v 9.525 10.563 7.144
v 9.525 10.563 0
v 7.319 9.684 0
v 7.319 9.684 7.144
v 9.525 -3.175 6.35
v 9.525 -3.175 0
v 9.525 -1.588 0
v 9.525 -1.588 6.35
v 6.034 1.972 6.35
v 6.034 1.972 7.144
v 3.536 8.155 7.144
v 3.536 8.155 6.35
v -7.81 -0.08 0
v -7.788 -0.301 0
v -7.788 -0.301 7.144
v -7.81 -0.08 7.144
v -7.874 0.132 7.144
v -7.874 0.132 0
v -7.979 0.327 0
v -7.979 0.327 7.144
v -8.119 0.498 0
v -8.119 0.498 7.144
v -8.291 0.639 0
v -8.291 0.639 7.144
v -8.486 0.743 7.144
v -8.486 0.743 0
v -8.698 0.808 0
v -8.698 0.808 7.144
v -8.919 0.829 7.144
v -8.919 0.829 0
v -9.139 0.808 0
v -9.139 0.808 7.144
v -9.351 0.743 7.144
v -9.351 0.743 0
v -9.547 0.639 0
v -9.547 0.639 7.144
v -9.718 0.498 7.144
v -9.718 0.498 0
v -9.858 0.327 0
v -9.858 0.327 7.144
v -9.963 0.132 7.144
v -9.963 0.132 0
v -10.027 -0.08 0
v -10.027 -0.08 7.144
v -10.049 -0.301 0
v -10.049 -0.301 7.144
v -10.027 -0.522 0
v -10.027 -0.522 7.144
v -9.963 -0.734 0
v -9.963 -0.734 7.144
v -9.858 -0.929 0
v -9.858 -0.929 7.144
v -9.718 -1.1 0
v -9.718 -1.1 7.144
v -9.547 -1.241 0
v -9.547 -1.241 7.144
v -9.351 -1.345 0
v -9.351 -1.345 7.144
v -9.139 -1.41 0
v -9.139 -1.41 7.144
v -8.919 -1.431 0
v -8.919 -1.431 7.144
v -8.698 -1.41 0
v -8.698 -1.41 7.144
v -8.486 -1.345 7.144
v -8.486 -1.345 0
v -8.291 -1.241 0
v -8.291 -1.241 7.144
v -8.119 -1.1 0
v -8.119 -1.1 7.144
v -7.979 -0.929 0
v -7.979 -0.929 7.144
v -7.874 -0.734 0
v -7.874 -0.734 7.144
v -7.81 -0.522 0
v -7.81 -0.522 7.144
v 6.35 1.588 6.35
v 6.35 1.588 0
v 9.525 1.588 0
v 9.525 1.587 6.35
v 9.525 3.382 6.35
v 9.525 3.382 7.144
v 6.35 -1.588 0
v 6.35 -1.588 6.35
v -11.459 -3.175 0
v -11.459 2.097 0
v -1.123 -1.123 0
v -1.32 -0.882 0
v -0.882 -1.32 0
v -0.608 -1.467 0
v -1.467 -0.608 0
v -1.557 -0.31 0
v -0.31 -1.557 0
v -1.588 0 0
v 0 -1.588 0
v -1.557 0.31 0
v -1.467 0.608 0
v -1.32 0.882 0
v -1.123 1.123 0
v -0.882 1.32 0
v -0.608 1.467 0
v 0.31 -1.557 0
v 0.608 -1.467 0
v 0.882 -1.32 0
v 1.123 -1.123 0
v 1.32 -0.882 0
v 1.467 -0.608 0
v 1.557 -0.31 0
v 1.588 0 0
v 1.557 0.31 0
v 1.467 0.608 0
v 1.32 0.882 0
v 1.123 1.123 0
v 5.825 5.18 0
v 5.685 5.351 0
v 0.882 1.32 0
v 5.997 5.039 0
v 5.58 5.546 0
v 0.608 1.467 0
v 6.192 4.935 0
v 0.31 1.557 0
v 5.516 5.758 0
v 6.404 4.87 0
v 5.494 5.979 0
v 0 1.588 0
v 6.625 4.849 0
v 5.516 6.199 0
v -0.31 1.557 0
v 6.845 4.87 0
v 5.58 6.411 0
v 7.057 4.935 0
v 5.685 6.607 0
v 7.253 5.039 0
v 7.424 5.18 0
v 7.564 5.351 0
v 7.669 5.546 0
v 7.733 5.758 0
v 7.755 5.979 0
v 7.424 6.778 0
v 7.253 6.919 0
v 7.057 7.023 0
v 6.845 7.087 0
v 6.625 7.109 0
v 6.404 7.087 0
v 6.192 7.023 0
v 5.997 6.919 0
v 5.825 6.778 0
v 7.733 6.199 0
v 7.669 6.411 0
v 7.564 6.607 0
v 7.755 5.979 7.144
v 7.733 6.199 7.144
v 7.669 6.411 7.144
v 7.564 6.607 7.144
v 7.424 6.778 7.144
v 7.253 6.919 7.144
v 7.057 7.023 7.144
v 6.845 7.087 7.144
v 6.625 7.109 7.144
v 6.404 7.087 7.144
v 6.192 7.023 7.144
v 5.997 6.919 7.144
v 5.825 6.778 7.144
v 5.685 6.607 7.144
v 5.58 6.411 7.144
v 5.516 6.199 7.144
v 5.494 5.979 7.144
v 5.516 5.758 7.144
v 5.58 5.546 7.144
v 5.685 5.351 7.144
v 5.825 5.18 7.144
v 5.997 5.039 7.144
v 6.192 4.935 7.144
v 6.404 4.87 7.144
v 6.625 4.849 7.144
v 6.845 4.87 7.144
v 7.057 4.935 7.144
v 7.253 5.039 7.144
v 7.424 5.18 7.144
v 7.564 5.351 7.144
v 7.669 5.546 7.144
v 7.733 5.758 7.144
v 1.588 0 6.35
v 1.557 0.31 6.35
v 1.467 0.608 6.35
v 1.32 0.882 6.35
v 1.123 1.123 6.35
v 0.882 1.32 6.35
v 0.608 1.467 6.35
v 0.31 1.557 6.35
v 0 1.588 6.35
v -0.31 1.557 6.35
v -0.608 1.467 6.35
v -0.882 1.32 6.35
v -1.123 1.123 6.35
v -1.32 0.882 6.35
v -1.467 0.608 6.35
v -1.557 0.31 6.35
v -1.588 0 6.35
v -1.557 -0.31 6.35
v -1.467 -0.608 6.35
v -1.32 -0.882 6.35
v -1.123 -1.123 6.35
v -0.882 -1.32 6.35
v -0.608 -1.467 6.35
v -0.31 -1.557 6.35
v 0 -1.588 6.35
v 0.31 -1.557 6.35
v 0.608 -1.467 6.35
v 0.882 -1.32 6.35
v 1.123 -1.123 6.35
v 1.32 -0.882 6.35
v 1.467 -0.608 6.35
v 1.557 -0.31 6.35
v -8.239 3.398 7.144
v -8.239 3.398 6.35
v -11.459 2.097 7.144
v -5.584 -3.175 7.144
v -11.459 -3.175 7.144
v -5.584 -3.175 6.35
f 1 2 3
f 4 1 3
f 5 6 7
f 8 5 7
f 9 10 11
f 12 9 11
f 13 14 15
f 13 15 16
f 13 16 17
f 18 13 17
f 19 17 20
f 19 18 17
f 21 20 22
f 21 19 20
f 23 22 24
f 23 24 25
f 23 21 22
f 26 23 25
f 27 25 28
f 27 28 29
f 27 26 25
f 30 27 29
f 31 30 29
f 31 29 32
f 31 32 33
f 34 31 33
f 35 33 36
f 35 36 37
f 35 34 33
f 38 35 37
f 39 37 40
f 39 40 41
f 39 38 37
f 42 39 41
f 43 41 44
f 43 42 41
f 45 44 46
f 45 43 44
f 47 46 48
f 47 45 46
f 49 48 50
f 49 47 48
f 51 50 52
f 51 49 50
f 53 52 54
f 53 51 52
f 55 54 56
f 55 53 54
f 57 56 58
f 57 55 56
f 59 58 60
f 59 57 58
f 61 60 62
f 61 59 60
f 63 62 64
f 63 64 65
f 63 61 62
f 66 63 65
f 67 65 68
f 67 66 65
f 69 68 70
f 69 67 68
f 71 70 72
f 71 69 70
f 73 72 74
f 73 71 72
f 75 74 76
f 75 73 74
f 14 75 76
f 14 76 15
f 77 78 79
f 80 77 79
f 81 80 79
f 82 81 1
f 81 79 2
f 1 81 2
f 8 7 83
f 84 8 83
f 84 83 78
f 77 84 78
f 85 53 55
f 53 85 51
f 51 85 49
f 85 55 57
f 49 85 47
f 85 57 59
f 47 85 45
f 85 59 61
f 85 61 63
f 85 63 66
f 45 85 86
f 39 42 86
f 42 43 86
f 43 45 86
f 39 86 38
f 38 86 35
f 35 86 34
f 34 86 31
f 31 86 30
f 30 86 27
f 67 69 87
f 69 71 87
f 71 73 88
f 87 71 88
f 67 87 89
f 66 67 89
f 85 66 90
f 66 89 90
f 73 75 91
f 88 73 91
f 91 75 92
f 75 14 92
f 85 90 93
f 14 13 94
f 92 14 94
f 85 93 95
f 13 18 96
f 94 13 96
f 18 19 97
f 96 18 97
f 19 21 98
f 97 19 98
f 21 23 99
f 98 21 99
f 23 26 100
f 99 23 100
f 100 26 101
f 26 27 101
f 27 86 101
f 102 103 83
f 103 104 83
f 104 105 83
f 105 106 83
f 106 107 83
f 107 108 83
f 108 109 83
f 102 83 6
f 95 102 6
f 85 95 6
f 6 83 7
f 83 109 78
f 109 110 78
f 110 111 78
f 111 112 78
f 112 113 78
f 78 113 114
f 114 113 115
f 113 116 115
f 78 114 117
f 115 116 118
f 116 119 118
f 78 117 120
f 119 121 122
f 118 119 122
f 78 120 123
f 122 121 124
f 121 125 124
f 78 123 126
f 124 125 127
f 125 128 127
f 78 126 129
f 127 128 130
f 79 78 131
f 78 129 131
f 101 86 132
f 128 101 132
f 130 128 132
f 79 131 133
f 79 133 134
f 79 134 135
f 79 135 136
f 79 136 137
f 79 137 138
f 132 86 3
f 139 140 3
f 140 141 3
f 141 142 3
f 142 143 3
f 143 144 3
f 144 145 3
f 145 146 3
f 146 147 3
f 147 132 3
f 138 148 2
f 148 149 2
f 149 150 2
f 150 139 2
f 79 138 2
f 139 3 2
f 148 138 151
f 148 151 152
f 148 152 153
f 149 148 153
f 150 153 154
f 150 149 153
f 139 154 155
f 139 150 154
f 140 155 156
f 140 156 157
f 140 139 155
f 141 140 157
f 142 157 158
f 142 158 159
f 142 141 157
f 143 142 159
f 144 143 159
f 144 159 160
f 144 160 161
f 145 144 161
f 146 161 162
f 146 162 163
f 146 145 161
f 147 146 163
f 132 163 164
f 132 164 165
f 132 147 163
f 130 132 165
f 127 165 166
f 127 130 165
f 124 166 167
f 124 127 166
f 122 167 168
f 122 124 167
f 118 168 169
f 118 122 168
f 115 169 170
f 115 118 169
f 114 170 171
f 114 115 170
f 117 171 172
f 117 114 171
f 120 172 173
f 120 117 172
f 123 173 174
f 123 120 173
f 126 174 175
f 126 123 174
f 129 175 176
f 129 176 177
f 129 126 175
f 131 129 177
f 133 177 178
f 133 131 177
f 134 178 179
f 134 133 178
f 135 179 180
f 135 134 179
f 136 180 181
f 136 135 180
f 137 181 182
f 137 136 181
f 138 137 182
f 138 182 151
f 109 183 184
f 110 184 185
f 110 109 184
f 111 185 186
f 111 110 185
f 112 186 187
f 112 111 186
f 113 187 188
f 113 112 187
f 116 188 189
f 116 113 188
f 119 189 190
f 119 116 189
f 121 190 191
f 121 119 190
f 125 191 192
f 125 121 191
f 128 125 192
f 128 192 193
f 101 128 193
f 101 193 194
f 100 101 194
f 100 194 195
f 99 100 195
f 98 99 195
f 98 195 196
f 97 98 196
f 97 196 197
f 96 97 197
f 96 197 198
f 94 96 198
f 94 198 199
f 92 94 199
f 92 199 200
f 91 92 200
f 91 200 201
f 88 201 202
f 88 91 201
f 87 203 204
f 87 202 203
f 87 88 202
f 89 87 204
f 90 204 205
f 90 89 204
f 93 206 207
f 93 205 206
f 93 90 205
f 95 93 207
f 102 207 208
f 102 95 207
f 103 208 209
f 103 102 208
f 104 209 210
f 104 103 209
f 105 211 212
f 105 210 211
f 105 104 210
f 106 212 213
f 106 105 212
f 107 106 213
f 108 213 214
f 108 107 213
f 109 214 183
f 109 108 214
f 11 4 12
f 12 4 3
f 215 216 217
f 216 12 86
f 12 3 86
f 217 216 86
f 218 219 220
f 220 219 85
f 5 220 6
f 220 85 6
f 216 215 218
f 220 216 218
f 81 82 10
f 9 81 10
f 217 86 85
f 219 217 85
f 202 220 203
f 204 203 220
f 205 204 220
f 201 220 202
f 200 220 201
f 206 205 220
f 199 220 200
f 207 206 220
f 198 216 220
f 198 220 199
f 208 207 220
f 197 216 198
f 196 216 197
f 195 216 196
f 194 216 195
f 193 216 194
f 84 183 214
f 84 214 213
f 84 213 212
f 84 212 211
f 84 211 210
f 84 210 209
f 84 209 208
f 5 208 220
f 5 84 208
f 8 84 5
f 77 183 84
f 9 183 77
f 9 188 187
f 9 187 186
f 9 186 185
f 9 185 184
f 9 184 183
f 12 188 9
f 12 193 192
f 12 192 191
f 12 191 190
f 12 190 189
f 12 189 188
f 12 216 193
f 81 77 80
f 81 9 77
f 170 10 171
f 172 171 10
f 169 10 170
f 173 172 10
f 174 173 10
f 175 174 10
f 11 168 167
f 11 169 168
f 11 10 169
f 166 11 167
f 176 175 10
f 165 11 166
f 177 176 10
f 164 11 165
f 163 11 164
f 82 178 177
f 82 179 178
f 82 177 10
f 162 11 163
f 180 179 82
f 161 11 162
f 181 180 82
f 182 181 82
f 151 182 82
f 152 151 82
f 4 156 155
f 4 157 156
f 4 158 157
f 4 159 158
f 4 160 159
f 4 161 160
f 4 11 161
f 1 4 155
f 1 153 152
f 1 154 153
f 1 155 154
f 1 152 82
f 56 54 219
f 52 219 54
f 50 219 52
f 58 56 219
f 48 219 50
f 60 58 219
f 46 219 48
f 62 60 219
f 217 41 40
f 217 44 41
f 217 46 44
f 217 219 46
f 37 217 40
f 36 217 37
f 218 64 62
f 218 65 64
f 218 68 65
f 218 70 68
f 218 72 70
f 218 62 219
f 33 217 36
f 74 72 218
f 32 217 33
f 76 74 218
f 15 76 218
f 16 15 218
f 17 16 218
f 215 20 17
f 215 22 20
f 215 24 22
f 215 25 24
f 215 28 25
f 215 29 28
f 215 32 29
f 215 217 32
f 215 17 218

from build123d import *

# Parameters (mm, degrees)
SKETCH1_R           = 1.5875
SKETCH1_R_2         = 1.1303
BOSS_EXTRUDE1_DEPTH = 7.14375
CUT_EXTRUDE2_DEPTH  = 0.79375


with BuildPart() as part:
    # Sketch1 → Boss-Extrude1 (new body)
    with BuildSketch(Plane.XY):
        Polygon((6.35, 1.5875), (9.525, 1.5875), (9.525, 4.224628752), (9.525, 10.562648806), (7.319307862, 9.683908365), (-11.458663934, 2.097115291), (-11.458663934, -3.175), (9.525, -3.175), (9.525, -1.5875), (6.35, -1.5875), align=None)
        Circle(SKETCH1_R, mode=Mode.SUBTRACT)
        with Locations((-8.918663934, -0.301005903)):
            Circle(SKETCH1_R_2, mode=Mode.SUBTRACT)
        with Locations((6.624646204, 5.978899029)):
            Circle(SKETCH1_R_2, mode=Mode.SUBTRACT)
    extrude(amount=BOSS_EXTRUDE1_DEPTH)

    # Sketch3 → Cut-Extrude2 (cut)
    with BuildSketch(Plane.XY.offset(7.14375)):
        Polygon((-8.345148438, 3.659663992), (-5.450582972, -3.504636938), (9.525, -3.219186714), (9.525, 3.382363055), (6.034120938, 1.971956363), (3.430086515, 8.417167728), align=None)
    extrude(amount=-CUT_EXTRUDE2_DEPTH, mode=Mode.SUBTRACT)


solid = part.part
